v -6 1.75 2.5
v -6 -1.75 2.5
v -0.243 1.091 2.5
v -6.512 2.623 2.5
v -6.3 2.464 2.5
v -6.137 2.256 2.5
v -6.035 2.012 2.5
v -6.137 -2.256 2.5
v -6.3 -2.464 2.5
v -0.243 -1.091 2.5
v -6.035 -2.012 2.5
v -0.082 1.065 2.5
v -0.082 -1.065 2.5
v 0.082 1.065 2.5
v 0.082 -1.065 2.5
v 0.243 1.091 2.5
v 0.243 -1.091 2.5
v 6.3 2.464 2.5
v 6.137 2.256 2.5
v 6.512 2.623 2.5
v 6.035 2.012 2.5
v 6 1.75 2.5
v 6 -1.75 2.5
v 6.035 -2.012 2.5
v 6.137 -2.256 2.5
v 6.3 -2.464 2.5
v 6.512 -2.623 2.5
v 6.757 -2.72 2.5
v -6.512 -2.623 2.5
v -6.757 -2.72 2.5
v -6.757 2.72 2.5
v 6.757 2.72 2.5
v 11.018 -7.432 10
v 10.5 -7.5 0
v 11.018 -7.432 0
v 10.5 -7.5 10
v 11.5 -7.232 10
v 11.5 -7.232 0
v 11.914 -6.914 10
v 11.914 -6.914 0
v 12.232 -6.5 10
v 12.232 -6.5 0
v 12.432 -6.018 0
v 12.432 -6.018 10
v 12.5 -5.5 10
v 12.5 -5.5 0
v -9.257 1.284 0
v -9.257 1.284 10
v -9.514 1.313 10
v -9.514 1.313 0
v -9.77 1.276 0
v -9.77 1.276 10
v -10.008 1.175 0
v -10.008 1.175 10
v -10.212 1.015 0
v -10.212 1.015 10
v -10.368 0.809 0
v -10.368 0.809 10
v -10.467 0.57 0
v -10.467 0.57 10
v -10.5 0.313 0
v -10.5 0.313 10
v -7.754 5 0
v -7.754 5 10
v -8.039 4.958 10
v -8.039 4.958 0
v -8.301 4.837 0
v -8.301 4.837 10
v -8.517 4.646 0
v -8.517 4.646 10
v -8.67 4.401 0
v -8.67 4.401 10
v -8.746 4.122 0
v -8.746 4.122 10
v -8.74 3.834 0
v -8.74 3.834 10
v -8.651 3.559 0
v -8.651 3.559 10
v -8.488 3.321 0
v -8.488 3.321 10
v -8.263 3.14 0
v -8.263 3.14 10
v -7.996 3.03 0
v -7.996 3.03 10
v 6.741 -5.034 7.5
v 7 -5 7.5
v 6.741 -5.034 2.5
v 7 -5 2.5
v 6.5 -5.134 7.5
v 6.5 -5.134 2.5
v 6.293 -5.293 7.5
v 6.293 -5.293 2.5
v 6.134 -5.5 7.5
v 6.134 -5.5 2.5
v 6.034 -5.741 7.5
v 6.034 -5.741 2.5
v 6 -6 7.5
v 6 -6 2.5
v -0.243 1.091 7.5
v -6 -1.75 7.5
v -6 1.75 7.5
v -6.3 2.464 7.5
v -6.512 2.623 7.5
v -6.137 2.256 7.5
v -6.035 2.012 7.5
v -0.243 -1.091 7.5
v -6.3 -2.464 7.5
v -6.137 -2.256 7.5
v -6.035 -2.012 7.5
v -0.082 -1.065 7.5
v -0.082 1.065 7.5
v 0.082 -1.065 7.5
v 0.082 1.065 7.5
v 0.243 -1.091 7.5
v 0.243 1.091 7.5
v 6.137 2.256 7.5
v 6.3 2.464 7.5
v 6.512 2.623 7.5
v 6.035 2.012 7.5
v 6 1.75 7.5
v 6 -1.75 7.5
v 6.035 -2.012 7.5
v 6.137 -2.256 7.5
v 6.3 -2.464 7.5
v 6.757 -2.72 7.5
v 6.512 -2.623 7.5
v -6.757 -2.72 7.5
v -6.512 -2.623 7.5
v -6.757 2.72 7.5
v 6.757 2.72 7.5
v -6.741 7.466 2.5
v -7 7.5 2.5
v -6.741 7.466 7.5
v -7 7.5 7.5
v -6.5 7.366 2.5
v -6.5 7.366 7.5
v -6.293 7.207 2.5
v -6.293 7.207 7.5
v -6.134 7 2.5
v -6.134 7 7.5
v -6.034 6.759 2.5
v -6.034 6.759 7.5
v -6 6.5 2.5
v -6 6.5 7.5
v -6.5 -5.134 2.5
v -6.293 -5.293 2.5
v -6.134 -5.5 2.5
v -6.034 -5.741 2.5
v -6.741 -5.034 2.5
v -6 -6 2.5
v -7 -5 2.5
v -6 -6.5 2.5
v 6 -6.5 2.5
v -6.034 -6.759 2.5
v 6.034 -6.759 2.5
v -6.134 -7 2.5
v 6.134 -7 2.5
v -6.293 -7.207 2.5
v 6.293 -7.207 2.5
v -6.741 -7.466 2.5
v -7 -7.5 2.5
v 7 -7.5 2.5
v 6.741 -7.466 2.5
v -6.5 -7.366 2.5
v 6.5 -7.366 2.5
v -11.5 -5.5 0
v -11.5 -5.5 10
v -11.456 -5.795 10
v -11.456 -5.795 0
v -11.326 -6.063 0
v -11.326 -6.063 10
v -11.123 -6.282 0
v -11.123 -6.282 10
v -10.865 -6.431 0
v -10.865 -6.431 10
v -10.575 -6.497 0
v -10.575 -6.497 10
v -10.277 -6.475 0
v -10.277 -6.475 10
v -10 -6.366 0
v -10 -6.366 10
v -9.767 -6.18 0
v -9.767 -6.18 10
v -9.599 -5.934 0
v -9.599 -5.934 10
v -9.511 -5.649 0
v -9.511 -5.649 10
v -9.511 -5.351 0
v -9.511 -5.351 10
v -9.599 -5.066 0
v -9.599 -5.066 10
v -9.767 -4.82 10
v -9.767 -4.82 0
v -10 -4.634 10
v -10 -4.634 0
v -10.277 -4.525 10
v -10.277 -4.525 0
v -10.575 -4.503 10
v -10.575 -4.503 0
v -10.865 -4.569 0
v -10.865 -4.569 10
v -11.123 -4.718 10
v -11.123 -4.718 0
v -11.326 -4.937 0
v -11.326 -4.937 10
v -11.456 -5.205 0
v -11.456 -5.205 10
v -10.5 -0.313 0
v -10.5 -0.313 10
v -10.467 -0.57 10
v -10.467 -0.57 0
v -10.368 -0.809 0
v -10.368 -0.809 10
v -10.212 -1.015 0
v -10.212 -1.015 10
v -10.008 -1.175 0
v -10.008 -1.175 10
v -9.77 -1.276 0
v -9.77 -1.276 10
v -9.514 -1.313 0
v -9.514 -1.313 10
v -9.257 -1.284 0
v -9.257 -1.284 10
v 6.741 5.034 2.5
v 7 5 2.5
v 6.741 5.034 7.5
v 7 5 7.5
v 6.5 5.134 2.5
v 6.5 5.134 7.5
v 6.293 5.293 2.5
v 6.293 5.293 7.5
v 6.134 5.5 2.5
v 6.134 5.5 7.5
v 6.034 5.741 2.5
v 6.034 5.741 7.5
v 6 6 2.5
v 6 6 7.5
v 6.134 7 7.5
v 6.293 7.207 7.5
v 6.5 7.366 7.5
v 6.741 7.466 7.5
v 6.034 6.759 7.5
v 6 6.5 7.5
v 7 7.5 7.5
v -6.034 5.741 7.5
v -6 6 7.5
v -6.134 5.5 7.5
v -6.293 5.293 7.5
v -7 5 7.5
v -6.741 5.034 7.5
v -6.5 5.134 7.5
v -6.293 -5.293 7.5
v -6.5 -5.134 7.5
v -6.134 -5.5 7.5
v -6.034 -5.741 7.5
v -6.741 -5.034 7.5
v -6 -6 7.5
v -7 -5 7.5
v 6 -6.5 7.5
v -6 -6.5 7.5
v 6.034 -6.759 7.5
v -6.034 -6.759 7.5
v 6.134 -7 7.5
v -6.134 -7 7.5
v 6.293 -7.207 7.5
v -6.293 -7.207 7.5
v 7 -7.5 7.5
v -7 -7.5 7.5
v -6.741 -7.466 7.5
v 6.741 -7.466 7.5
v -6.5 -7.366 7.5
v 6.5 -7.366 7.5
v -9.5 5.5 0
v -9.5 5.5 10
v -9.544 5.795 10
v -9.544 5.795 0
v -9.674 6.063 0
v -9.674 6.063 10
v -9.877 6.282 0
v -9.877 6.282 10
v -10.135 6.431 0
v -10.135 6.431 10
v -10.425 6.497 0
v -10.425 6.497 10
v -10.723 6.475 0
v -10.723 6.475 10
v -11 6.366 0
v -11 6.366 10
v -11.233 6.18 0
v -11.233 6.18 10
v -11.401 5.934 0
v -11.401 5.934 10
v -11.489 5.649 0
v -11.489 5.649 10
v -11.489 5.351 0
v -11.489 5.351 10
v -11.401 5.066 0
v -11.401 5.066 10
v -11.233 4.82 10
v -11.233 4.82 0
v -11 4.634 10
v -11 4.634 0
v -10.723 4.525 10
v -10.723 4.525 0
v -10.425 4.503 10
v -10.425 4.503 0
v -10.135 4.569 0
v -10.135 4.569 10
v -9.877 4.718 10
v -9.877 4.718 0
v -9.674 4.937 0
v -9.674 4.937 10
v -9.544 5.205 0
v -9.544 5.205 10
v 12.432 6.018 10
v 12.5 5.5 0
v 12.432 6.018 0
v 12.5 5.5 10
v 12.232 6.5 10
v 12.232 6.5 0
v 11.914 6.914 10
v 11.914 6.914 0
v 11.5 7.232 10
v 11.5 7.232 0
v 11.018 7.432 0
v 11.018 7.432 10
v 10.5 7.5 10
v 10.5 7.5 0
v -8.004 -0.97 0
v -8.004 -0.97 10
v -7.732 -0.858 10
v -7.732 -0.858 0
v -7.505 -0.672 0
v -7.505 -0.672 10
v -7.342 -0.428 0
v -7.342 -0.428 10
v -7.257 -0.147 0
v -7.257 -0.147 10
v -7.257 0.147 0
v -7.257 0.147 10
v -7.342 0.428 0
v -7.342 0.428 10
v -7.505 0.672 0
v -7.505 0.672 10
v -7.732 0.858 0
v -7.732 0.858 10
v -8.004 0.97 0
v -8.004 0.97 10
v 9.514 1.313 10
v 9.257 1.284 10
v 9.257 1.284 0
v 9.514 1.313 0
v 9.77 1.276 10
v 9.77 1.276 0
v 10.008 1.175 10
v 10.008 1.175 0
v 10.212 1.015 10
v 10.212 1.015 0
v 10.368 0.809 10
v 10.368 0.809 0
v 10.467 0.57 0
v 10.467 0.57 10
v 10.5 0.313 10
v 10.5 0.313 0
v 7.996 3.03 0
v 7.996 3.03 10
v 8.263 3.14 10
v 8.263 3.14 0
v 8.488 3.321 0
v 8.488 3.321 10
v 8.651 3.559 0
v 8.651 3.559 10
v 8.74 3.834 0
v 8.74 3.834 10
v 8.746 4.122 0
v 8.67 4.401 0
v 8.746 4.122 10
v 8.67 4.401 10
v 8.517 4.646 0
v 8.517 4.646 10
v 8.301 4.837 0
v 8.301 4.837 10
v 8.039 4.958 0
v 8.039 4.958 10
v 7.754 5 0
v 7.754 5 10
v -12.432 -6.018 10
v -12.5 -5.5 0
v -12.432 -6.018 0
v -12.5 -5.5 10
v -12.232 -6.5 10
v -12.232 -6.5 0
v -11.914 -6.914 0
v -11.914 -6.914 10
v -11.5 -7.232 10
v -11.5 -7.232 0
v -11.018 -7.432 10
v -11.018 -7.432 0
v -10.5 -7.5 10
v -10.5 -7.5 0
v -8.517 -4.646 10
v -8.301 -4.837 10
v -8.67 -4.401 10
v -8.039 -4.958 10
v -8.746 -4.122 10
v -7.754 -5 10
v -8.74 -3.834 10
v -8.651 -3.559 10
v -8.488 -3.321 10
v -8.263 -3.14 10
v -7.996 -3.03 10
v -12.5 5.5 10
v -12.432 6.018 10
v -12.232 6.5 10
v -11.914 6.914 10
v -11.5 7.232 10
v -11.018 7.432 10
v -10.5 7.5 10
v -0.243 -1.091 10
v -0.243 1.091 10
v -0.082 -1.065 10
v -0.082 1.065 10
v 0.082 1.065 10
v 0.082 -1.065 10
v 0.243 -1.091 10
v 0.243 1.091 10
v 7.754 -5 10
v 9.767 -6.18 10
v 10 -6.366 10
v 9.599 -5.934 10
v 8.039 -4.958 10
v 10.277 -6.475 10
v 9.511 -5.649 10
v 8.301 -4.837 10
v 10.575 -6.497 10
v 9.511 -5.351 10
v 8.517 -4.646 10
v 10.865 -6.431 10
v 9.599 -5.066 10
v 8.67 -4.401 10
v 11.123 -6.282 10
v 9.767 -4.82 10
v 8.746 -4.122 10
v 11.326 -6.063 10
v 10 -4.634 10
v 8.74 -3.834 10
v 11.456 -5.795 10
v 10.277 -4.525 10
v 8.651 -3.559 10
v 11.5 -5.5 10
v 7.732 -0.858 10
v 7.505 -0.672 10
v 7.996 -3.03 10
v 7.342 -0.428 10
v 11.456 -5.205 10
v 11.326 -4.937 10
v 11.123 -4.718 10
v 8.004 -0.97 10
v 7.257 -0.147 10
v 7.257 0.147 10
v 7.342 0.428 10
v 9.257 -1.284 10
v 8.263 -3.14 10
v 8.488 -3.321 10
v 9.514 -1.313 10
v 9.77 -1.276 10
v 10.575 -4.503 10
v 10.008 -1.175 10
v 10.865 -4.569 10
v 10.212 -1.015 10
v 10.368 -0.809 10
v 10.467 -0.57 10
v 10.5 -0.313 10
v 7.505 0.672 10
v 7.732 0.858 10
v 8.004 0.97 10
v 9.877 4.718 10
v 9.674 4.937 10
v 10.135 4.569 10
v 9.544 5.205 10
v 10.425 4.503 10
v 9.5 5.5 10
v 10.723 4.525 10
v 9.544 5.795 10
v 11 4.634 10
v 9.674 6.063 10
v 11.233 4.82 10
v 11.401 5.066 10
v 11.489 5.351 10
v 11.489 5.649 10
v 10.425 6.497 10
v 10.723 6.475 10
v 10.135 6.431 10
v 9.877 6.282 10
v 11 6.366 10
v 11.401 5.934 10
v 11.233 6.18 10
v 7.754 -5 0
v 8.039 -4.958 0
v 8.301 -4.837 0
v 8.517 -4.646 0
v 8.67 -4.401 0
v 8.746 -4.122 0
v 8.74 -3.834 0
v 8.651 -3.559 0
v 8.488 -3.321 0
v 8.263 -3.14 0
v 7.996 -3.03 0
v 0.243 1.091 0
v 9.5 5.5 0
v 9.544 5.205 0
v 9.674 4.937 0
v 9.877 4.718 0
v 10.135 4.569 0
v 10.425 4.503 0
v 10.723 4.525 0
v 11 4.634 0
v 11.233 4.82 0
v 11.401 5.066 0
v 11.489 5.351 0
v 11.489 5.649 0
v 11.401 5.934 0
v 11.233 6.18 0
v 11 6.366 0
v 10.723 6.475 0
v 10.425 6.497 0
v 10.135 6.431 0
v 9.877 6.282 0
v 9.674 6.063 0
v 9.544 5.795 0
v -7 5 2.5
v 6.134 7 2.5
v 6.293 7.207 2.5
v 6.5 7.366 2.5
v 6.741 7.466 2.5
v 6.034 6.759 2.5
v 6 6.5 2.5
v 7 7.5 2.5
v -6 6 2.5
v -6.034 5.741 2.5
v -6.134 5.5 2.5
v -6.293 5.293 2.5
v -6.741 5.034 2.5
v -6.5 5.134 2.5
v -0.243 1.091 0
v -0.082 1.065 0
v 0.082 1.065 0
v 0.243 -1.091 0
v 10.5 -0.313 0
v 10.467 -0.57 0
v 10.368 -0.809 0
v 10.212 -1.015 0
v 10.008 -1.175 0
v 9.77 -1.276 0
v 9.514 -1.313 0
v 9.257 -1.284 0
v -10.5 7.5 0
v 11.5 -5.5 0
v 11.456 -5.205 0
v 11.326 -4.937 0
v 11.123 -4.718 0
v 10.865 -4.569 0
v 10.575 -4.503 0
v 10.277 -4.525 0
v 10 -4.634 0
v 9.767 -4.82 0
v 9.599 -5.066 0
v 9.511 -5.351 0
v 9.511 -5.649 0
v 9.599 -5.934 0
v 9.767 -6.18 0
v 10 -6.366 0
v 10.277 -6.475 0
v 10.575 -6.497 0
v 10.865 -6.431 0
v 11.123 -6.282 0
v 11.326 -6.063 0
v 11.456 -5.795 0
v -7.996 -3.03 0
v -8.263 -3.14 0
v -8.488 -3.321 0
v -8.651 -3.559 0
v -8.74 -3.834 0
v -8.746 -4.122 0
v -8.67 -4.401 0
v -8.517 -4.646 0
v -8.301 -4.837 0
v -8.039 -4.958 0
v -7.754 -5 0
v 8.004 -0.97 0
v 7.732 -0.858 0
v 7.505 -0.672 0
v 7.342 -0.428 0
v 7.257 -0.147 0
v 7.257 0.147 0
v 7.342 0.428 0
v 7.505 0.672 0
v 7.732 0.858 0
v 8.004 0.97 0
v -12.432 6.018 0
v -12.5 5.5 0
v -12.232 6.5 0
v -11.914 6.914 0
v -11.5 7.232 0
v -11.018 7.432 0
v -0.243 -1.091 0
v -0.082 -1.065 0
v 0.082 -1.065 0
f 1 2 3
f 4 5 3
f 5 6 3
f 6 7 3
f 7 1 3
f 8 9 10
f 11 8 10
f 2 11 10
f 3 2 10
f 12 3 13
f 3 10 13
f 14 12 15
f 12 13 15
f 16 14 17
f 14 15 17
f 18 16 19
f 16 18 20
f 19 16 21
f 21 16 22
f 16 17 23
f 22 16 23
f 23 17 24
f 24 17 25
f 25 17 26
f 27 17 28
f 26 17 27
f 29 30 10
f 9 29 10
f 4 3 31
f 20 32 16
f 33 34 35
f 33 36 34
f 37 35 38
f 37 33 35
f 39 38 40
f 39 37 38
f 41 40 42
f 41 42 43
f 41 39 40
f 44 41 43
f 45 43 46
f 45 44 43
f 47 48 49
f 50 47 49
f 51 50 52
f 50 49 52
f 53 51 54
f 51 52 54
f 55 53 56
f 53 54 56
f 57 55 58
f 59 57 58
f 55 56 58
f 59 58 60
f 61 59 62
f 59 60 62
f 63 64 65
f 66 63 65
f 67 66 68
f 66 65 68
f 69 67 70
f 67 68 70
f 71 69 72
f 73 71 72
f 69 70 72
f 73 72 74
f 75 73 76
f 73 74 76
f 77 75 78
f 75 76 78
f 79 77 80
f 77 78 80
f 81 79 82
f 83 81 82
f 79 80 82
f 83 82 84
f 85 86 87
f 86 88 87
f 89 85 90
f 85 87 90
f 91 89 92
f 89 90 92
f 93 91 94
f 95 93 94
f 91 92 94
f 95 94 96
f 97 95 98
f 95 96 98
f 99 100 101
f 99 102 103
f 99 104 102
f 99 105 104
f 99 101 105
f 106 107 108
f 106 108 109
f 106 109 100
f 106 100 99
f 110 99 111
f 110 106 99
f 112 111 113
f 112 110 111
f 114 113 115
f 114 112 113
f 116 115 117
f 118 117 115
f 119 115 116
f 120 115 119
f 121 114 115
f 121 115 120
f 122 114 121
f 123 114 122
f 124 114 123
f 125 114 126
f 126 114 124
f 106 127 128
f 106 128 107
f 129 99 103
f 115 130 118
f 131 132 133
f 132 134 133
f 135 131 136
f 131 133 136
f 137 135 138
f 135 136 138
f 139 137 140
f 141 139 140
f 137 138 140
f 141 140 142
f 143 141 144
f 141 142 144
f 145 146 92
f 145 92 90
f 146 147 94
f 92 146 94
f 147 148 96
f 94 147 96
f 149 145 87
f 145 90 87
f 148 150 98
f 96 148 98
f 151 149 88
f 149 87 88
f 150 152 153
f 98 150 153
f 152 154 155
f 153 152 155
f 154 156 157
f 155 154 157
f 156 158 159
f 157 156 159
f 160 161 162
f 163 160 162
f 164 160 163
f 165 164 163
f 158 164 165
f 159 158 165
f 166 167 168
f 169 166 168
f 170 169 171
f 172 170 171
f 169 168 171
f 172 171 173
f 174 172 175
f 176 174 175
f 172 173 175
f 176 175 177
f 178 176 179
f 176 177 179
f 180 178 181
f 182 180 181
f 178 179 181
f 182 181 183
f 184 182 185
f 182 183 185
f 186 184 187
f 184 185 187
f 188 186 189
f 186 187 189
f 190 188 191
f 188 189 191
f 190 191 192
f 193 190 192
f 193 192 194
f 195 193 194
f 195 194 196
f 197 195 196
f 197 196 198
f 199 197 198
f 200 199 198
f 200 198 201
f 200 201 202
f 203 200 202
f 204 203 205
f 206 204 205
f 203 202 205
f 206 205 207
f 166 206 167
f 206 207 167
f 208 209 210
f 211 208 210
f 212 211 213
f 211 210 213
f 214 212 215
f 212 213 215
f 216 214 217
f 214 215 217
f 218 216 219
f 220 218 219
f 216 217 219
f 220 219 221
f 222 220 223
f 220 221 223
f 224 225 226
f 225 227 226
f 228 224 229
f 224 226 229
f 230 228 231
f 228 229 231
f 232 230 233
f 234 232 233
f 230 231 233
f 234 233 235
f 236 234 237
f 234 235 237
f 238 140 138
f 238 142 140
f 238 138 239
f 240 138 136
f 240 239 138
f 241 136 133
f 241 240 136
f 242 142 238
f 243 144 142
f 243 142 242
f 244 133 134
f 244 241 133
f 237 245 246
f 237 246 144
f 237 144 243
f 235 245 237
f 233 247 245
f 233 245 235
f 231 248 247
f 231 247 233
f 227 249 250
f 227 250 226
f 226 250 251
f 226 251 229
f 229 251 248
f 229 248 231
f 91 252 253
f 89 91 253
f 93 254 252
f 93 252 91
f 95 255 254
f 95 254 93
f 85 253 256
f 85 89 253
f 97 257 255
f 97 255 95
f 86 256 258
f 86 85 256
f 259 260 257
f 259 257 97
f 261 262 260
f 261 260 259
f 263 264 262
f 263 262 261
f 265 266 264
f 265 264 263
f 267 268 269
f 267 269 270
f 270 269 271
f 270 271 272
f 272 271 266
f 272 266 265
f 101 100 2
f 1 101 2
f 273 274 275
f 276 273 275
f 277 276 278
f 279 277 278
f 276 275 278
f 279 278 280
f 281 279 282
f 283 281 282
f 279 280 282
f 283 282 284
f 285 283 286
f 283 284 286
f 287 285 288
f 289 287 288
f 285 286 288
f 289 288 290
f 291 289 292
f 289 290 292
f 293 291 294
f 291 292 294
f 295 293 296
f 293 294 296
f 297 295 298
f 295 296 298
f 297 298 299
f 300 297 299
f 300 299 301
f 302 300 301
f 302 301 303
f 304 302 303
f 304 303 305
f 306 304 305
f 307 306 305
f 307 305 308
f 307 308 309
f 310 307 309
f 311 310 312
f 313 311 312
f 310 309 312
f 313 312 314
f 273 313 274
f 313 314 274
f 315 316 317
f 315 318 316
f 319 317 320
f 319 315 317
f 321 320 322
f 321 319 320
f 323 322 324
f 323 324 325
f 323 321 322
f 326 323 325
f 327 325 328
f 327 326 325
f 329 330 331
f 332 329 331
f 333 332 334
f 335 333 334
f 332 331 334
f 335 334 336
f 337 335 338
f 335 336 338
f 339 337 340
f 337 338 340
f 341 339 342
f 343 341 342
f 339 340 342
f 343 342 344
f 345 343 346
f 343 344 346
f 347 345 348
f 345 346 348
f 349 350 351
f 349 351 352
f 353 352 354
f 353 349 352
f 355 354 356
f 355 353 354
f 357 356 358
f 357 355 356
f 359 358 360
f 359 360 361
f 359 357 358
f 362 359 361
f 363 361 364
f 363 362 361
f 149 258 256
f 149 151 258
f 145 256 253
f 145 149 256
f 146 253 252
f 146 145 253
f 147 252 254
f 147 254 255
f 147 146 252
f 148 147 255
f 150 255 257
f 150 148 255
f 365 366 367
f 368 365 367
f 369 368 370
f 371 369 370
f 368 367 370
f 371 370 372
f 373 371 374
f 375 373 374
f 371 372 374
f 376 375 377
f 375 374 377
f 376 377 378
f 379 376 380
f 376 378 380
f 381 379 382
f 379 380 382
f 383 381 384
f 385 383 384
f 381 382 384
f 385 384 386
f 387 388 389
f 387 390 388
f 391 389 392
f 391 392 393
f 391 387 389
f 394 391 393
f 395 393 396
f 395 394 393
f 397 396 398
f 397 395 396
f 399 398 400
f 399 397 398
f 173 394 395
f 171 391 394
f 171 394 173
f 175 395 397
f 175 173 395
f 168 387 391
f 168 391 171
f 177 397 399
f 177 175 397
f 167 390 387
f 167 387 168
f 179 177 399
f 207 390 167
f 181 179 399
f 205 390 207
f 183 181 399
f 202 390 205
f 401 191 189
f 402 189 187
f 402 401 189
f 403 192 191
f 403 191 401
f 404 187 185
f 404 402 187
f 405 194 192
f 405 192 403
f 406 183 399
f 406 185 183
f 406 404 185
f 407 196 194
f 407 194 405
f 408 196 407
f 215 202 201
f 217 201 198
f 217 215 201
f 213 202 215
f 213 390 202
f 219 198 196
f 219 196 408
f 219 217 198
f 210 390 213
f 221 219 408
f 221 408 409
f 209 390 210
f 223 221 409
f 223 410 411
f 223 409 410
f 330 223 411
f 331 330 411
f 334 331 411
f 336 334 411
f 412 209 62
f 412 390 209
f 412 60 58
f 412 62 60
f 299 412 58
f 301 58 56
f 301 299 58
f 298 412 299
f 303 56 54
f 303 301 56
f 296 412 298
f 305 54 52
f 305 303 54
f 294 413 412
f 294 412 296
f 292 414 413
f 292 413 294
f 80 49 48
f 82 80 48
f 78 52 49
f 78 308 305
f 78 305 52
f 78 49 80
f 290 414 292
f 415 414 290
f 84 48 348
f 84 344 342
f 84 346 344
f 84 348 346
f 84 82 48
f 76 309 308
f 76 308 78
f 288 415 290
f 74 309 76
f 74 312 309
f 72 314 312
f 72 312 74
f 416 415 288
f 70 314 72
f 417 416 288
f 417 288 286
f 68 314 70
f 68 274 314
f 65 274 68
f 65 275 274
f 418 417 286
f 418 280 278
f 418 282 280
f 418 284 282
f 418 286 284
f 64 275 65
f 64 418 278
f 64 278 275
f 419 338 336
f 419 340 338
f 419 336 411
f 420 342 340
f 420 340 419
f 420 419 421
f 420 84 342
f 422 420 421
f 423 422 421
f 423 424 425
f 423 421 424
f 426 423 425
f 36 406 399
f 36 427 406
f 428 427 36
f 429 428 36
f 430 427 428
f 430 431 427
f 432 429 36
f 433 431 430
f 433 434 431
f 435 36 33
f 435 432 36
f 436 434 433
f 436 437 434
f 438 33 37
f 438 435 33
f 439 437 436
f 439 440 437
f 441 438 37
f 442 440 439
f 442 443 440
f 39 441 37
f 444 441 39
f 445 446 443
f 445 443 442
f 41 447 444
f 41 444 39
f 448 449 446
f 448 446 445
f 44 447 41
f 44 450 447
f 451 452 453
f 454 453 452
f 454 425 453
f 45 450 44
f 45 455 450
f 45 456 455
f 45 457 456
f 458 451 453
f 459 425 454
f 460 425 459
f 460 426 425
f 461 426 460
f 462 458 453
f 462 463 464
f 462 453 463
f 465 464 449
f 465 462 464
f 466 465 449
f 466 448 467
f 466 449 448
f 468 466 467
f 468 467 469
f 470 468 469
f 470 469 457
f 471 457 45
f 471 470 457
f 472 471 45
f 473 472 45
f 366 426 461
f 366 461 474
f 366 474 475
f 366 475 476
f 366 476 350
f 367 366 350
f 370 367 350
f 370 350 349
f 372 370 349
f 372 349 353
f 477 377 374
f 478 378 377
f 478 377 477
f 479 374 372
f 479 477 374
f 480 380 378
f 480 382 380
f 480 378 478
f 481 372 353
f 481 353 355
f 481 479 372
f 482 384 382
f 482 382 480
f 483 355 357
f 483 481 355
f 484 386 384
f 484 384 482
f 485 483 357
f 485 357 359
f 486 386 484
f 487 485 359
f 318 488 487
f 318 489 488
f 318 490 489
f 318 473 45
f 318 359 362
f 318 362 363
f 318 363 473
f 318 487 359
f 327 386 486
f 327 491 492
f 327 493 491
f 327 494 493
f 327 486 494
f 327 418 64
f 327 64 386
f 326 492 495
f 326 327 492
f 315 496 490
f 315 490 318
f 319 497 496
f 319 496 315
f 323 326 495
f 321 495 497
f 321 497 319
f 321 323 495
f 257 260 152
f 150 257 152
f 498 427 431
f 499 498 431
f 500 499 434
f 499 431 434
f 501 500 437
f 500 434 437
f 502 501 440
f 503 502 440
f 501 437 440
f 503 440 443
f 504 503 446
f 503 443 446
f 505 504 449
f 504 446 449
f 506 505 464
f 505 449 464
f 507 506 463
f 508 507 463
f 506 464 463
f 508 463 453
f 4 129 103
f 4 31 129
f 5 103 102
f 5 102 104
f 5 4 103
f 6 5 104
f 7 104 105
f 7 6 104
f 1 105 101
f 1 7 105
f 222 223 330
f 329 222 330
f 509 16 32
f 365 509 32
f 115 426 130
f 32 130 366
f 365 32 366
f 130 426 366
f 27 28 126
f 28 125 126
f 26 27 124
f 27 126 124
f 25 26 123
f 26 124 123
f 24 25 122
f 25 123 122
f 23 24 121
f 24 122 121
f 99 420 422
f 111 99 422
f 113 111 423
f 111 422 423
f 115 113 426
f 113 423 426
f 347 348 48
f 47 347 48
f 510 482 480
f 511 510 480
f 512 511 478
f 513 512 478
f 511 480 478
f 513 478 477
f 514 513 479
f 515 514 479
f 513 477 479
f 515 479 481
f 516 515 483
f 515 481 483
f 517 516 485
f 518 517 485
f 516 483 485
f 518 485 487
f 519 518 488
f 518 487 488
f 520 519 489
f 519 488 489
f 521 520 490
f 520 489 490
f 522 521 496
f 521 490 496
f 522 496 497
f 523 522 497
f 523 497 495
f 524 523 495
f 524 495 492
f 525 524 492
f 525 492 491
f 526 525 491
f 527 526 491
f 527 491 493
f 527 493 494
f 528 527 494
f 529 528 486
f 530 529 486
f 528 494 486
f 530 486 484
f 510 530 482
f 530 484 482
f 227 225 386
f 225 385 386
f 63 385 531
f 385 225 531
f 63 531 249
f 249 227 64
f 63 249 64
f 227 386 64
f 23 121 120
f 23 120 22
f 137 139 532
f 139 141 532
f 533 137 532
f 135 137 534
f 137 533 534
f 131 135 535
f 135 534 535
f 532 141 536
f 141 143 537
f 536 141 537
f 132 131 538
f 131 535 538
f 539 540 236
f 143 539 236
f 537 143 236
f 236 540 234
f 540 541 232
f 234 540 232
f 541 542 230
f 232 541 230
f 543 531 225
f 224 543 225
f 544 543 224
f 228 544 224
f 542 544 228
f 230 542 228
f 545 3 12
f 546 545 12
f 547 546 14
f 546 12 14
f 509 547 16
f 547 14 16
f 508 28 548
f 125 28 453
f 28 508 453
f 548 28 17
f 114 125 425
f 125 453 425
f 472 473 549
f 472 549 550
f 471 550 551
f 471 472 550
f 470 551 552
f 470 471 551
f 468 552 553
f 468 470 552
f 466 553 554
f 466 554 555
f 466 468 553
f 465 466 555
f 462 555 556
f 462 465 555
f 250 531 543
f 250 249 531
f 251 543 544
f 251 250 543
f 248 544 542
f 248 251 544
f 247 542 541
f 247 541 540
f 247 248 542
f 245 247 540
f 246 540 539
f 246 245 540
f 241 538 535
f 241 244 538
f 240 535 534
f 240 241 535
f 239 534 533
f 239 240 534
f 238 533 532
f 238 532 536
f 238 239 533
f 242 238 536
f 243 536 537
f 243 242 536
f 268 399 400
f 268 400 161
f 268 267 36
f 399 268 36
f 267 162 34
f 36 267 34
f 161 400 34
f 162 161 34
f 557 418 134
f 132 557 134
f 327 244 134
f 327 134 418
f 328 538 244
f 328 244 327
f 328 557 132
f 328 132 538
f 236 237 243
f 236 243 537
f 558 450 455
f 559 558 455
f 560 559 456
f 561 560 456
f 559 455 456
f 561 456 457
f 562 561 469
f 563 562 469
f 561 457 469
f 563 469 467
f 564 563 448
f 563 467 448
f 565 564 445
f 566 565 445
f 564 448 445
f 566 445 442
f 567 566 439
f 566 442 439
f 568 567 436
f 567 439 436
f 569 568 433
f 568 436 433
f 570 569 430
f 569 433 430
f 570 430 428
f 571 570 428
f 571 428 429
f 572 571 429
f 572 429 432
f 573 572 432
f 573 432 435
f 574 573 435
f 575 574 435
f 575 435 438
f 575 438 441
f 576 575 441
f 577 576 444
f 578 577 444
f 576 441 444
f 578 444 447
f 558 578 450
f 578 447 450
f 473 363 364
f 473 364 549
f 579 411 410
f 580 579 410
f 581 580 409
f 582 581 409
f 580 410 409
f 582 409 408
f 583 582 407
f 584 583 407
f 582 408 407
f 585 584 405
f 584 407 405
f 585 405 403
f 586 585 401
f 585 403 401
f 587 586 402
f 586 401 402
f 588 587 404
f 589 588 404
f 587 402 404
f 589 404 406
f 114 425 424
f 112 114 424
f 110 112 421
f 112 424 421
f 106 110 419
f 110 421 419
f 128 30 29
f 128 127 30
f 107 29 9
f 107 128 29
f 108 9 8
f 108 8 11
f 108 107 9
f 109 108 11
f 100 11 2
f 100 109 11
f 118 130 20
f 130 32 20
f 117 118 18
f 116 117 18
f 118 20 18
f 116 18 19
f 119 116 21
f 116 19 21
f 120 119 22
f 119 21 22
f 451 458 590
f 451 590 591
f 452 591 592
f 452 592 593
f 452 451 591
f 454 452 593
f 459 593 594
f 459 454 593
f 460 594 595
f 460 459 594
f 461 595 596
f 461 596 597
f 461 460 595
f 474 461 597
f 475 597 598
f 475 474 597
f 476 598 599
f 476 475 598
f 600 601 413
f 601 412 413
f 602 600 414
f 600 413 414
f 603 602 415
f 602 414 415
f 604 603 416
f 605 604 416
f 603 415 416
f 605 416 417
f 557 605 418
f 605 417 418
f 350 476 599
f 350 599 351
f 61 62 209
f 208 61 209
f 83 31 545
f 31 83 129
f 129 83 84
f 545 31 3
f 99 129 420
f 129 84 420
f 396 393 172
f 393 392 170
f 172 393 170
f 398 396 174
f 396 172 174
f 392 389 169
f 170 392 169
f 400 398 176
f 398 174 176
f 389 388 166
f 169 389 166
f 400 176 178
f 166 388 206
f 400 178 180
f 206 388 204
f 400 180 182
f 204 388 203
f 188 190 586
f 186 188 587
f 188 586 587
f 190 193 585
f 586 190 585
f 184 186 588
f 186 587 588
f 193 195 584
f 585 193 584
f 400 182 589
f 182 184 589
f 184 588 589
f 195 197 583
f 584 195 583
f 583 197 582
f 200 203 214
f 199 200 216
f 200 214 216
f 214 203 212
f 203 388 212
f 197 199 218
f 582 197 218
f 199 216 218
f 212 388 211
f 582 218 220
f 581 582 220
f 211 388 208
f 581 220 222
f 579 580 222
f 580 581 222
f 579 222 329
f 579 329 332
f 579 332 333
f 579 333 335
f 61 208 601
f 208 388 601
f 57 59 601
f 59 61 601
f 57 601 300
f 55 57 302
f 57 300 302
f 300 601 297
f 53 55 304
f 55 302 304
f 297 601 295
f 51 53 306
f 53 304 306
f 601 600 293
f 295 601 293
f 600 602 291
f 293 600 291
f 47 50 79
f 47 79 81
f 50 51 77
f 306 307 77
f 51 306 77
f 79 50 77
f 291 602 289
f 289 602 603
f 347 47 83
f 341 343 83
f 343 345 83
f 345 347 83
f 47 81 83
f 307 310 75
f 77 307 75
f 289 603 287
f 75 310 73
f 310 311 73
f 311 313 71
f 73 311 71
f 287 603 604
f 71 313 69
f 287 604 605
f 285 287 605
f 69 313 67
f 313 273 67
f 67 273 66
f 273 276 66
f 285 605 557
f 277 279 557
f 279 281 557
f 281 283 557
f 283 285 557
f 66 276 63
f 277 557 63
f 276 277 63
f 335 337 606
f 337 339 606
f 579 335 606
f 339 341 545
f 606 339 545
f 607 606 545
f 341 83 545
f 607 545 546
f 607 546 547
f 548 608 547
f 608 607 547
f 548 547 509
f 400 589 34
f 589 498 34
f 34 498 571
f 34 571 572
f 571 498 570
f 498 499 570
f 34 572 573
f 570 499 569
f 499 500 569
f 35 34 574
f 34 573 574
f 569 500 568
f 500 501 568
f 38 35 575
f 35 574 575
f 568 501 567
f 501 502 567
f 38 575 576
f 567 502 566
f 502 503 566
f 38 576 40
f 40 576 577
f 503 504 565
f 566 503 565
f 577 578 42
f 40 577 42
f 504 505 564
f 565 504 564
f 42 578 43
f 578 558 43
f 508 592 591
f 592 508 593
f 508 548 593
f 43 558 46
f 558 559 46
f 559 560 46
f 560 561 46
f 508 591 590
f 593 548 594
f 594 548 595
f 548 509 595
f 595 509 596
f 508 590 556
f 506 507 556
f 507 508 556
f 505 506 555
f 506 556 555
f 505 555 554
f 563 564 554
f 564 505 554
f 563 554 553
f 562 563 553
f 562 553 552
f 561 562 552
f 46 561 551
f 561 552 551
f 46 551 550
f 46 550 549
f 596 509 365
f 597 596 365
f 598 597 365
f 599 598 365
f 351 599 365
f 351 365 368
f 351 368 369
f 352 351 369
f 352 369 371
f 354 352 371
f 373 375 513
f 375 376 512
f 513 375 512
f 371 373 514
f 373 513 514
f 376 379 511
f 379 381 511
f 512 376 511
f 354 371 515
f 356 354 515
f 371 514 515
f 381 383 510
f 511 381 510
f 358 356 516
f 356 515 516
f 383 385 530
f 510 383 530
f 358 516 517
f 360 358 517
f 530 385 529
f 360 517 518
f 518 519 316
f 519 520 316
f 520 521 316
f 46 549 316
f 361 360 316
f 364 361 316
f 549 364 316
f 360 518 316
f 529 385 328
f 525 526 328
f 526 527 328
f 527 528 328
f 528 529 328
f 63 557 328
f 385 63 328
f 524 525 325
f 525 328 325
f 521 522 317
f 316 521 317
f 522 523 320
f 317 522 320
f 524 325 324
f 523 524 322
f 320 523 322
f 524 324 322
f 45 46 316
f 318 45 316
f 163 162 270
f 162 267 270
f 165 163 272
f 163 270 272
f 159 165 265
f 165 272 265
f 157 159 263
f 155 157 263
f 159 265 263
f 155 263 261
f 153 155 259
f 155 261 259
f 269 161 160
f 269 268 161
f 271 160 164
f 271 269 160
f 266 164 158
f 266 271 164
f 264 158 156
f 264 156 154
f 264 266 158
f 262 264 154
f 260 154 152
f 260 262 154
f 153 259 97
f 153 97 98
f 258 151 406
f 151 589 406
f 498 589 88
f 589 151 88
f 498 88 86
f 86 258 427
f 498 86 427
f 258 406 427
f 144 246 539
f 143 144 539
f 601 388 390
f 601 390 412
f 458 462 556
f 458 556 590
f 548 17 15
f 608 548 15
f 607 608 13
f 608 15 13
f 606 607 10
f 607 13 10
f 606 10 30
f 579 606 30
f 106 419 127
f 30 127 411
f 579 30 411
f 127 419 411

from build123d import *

# Parameters (mm, degrees)
SKETCH_1_W               = 25
SKETCH_1_H               = 15
EXTRUDE_1_DEPTH          = 10
FILLET_4_R               = 2
CUT_EXTRUDE_3_DEPTH      = 10
SKETCH_3_R               = 1
CUT_EXTRUDE_4_DEPTH      = 10
CUT_EXTRUDE_5_DEPTH      = 22.937410968
CUT_EXTRUDE_5_DEPTH_BACK = 22.937410968
SKETCH_4_W               = 12
SKETCH_4_H               = 5
FILLET_5_R               = 1


with BuildPart() as part:
    # 草图1 → 凸台-拉伸1 (new body)
    with BuildSketch(Plane.XY):
        Rectangle(SKETCH_1_W, SKETCH_1_H)
    extrude(amount=EXTRUDE_1_DEPTH)

    # 圆角4
    fillet_4_edges = [part.edges().sort_by_distance(p)[0] for p in [
        (12.5, -7.5, 5),
        (-12.5, -7.5, 5),
        (-12.5, 7.5, 5),
        (12.5, 7.5, 5),
    ]]
    fillet(fillet_4_edges, radius=FILLET_4_R)

    # 草图2 → 切除-拉伸3 (cut)
    with BuildSketch(Plane.XY.offset(10)):
        with BuildLine():
            Line((-0.242535625, -1.091410313), (-7.996324374, -3.0298575))
            ThreePointArc((-7.996324374, -3.0298575), (-8.746296305, -4.122183264), (-7.753788749, -5))
            Line((-7.753788749, -5), (7.753788749, -5))
            ThreePointArc((7.753788749, -5), (8.746296305, -4.122183264), (7.996324374, -3.0298575))
            Line((7.996324374, -3.0298575), (0.242535625, -1.091410313))
            ThreePointArc((0.242535625, -1.091410313), (0, -1.061552813), (-0.242535625, -1.091410313))
        make_face()
        with BuildLine():
            Line((7.753788749, 5), (-7.753788749, 5))
            ThreePointArc((-7.753788749, 5), (-8.746296305, 4.122183264), (-7.996324374, 3.0298575))
            Line((-7.996324374, 3.0298575), (-0.242535625, 1.091410313))
            ThreePointArc((-0.242535625, 1.091410313), (0, 1.061552813), (0.242535625, 1.091410313))
            Line((0.242535625, 1.091410313), (7.996324374, 3.0298575))
            ThreePointArc((7.996324374, 3.0298575), (8.746296305, 4.122183264), (7.753788749, 5))
        make_face()
        with BuildLine():
            Line((-9.257464375, -1.283589687), (-8.003675626, -0.9701425))
            ThreePointArc((-8.003675626, -0.9701425), (-7.246211251, 0), (-8.003675626, 0.9701425))
            Line((-8.003675626, 0.9701425), (-9.257464375, 1.283589687))
            ThreePointArc((-9.257464375, 1.283589687), (-10.115412209, 1.101652625), (-10.5, 0.313447187))
            Line((-10.5, 0.313447187), (-10.5, -0.313447187))
            ThreePointArc((-10.5, -0.313447187), (-10.115412209, -1.101652625), (-9.257464375, -1.283589687))
        make_face()
        with BuildLine():
            Line((10.5, 0.313447187), (10.5, -0.313447187))
            ThreePointArc((10.5, -0.313447187), (10.115412209, -1.101652625), (9.257464375, -1.283589687))
            Line((9.257464375, -1.283589687), (8.003675626, -0.9701425))
            ThreePointArc((8.003675626, -0.9701425), (7.246211251, 0), (8.003675626, 0.9701425))
            Line((8.003675626, 0.9701425), (9.257464375, 1.283589687))
            ThreePointArc((9.257464375, 1.283589687), (10.115412209, 1.101652625), (10.5, 0.313447187))
        make_face()
    extrude(amount=-CUT_EXTRUDE_3_DEPTH, mode=Mode.SUBTRACT)

    # 草图3 → 切除-拉伸4 (cut)
    with BuildSketch(Plane.XY.offset(10)):
        with Locations((-10.5, 5.5)):
            Circle(SKETCH_3_R)
        with Locations(Location((10.5, 5.5, 0), (0, 0, 180))):
            Circle(SKETCH_3_R)
        with Locations((10.5, -5.5)):
            Circle(SKETCH_3_R)
        with Locations(Location((-10.5, -5.5, 0), (0, 0, 180))):
            Circle(SKETCH_3_R)
    extrude(amount=-CUT_EXTRUDE_4_DEPTH, mode=Mode.SUBTRACT)

    # 草图4 → 切除-拉伸5 (cut, two sides: drawn at the far end of the back side and taken through both)
    with BuildSketch(Plane(origin=(0, 7.5, 0), x_dir=(1, 0, 0), z_dir=(0, 1, 0)).offset(-CUT_EXTRUDE_5_DEPTH_BACK)):
        with Locations((0, -5)):
            Rectangle(SKETCH_4_W, SKETCH_4_H)
    extrude(amount=CUT_EXTRUDE_5_DEPTH + CUT_EXTRUDE_5_DEPTH_BACK, mode=Mode.SUBTRACT)

    # 圆角5
    fillet_5_edges = [part.edges().sort_by_distance(p)[0] for p in [
        (6, 2.530776406, 5),
        (-6, 5, 5),
        (-6, 7.5, 5),
        (-6, -5, 5),
        (-6, -7.5, 5),
        (-6, -2.530776406, 5),
        (-6, 2.530776406, 5),
        (6, 7.5, 5),
        (6, 5, 5),
        (6, -2.530776406, 5),
        (6, -5, 5),
        (6, -7.5, 5),
    ]]
    fillet(fillet_5_edges, radius=FILLET_5_R)


solid = part.part
